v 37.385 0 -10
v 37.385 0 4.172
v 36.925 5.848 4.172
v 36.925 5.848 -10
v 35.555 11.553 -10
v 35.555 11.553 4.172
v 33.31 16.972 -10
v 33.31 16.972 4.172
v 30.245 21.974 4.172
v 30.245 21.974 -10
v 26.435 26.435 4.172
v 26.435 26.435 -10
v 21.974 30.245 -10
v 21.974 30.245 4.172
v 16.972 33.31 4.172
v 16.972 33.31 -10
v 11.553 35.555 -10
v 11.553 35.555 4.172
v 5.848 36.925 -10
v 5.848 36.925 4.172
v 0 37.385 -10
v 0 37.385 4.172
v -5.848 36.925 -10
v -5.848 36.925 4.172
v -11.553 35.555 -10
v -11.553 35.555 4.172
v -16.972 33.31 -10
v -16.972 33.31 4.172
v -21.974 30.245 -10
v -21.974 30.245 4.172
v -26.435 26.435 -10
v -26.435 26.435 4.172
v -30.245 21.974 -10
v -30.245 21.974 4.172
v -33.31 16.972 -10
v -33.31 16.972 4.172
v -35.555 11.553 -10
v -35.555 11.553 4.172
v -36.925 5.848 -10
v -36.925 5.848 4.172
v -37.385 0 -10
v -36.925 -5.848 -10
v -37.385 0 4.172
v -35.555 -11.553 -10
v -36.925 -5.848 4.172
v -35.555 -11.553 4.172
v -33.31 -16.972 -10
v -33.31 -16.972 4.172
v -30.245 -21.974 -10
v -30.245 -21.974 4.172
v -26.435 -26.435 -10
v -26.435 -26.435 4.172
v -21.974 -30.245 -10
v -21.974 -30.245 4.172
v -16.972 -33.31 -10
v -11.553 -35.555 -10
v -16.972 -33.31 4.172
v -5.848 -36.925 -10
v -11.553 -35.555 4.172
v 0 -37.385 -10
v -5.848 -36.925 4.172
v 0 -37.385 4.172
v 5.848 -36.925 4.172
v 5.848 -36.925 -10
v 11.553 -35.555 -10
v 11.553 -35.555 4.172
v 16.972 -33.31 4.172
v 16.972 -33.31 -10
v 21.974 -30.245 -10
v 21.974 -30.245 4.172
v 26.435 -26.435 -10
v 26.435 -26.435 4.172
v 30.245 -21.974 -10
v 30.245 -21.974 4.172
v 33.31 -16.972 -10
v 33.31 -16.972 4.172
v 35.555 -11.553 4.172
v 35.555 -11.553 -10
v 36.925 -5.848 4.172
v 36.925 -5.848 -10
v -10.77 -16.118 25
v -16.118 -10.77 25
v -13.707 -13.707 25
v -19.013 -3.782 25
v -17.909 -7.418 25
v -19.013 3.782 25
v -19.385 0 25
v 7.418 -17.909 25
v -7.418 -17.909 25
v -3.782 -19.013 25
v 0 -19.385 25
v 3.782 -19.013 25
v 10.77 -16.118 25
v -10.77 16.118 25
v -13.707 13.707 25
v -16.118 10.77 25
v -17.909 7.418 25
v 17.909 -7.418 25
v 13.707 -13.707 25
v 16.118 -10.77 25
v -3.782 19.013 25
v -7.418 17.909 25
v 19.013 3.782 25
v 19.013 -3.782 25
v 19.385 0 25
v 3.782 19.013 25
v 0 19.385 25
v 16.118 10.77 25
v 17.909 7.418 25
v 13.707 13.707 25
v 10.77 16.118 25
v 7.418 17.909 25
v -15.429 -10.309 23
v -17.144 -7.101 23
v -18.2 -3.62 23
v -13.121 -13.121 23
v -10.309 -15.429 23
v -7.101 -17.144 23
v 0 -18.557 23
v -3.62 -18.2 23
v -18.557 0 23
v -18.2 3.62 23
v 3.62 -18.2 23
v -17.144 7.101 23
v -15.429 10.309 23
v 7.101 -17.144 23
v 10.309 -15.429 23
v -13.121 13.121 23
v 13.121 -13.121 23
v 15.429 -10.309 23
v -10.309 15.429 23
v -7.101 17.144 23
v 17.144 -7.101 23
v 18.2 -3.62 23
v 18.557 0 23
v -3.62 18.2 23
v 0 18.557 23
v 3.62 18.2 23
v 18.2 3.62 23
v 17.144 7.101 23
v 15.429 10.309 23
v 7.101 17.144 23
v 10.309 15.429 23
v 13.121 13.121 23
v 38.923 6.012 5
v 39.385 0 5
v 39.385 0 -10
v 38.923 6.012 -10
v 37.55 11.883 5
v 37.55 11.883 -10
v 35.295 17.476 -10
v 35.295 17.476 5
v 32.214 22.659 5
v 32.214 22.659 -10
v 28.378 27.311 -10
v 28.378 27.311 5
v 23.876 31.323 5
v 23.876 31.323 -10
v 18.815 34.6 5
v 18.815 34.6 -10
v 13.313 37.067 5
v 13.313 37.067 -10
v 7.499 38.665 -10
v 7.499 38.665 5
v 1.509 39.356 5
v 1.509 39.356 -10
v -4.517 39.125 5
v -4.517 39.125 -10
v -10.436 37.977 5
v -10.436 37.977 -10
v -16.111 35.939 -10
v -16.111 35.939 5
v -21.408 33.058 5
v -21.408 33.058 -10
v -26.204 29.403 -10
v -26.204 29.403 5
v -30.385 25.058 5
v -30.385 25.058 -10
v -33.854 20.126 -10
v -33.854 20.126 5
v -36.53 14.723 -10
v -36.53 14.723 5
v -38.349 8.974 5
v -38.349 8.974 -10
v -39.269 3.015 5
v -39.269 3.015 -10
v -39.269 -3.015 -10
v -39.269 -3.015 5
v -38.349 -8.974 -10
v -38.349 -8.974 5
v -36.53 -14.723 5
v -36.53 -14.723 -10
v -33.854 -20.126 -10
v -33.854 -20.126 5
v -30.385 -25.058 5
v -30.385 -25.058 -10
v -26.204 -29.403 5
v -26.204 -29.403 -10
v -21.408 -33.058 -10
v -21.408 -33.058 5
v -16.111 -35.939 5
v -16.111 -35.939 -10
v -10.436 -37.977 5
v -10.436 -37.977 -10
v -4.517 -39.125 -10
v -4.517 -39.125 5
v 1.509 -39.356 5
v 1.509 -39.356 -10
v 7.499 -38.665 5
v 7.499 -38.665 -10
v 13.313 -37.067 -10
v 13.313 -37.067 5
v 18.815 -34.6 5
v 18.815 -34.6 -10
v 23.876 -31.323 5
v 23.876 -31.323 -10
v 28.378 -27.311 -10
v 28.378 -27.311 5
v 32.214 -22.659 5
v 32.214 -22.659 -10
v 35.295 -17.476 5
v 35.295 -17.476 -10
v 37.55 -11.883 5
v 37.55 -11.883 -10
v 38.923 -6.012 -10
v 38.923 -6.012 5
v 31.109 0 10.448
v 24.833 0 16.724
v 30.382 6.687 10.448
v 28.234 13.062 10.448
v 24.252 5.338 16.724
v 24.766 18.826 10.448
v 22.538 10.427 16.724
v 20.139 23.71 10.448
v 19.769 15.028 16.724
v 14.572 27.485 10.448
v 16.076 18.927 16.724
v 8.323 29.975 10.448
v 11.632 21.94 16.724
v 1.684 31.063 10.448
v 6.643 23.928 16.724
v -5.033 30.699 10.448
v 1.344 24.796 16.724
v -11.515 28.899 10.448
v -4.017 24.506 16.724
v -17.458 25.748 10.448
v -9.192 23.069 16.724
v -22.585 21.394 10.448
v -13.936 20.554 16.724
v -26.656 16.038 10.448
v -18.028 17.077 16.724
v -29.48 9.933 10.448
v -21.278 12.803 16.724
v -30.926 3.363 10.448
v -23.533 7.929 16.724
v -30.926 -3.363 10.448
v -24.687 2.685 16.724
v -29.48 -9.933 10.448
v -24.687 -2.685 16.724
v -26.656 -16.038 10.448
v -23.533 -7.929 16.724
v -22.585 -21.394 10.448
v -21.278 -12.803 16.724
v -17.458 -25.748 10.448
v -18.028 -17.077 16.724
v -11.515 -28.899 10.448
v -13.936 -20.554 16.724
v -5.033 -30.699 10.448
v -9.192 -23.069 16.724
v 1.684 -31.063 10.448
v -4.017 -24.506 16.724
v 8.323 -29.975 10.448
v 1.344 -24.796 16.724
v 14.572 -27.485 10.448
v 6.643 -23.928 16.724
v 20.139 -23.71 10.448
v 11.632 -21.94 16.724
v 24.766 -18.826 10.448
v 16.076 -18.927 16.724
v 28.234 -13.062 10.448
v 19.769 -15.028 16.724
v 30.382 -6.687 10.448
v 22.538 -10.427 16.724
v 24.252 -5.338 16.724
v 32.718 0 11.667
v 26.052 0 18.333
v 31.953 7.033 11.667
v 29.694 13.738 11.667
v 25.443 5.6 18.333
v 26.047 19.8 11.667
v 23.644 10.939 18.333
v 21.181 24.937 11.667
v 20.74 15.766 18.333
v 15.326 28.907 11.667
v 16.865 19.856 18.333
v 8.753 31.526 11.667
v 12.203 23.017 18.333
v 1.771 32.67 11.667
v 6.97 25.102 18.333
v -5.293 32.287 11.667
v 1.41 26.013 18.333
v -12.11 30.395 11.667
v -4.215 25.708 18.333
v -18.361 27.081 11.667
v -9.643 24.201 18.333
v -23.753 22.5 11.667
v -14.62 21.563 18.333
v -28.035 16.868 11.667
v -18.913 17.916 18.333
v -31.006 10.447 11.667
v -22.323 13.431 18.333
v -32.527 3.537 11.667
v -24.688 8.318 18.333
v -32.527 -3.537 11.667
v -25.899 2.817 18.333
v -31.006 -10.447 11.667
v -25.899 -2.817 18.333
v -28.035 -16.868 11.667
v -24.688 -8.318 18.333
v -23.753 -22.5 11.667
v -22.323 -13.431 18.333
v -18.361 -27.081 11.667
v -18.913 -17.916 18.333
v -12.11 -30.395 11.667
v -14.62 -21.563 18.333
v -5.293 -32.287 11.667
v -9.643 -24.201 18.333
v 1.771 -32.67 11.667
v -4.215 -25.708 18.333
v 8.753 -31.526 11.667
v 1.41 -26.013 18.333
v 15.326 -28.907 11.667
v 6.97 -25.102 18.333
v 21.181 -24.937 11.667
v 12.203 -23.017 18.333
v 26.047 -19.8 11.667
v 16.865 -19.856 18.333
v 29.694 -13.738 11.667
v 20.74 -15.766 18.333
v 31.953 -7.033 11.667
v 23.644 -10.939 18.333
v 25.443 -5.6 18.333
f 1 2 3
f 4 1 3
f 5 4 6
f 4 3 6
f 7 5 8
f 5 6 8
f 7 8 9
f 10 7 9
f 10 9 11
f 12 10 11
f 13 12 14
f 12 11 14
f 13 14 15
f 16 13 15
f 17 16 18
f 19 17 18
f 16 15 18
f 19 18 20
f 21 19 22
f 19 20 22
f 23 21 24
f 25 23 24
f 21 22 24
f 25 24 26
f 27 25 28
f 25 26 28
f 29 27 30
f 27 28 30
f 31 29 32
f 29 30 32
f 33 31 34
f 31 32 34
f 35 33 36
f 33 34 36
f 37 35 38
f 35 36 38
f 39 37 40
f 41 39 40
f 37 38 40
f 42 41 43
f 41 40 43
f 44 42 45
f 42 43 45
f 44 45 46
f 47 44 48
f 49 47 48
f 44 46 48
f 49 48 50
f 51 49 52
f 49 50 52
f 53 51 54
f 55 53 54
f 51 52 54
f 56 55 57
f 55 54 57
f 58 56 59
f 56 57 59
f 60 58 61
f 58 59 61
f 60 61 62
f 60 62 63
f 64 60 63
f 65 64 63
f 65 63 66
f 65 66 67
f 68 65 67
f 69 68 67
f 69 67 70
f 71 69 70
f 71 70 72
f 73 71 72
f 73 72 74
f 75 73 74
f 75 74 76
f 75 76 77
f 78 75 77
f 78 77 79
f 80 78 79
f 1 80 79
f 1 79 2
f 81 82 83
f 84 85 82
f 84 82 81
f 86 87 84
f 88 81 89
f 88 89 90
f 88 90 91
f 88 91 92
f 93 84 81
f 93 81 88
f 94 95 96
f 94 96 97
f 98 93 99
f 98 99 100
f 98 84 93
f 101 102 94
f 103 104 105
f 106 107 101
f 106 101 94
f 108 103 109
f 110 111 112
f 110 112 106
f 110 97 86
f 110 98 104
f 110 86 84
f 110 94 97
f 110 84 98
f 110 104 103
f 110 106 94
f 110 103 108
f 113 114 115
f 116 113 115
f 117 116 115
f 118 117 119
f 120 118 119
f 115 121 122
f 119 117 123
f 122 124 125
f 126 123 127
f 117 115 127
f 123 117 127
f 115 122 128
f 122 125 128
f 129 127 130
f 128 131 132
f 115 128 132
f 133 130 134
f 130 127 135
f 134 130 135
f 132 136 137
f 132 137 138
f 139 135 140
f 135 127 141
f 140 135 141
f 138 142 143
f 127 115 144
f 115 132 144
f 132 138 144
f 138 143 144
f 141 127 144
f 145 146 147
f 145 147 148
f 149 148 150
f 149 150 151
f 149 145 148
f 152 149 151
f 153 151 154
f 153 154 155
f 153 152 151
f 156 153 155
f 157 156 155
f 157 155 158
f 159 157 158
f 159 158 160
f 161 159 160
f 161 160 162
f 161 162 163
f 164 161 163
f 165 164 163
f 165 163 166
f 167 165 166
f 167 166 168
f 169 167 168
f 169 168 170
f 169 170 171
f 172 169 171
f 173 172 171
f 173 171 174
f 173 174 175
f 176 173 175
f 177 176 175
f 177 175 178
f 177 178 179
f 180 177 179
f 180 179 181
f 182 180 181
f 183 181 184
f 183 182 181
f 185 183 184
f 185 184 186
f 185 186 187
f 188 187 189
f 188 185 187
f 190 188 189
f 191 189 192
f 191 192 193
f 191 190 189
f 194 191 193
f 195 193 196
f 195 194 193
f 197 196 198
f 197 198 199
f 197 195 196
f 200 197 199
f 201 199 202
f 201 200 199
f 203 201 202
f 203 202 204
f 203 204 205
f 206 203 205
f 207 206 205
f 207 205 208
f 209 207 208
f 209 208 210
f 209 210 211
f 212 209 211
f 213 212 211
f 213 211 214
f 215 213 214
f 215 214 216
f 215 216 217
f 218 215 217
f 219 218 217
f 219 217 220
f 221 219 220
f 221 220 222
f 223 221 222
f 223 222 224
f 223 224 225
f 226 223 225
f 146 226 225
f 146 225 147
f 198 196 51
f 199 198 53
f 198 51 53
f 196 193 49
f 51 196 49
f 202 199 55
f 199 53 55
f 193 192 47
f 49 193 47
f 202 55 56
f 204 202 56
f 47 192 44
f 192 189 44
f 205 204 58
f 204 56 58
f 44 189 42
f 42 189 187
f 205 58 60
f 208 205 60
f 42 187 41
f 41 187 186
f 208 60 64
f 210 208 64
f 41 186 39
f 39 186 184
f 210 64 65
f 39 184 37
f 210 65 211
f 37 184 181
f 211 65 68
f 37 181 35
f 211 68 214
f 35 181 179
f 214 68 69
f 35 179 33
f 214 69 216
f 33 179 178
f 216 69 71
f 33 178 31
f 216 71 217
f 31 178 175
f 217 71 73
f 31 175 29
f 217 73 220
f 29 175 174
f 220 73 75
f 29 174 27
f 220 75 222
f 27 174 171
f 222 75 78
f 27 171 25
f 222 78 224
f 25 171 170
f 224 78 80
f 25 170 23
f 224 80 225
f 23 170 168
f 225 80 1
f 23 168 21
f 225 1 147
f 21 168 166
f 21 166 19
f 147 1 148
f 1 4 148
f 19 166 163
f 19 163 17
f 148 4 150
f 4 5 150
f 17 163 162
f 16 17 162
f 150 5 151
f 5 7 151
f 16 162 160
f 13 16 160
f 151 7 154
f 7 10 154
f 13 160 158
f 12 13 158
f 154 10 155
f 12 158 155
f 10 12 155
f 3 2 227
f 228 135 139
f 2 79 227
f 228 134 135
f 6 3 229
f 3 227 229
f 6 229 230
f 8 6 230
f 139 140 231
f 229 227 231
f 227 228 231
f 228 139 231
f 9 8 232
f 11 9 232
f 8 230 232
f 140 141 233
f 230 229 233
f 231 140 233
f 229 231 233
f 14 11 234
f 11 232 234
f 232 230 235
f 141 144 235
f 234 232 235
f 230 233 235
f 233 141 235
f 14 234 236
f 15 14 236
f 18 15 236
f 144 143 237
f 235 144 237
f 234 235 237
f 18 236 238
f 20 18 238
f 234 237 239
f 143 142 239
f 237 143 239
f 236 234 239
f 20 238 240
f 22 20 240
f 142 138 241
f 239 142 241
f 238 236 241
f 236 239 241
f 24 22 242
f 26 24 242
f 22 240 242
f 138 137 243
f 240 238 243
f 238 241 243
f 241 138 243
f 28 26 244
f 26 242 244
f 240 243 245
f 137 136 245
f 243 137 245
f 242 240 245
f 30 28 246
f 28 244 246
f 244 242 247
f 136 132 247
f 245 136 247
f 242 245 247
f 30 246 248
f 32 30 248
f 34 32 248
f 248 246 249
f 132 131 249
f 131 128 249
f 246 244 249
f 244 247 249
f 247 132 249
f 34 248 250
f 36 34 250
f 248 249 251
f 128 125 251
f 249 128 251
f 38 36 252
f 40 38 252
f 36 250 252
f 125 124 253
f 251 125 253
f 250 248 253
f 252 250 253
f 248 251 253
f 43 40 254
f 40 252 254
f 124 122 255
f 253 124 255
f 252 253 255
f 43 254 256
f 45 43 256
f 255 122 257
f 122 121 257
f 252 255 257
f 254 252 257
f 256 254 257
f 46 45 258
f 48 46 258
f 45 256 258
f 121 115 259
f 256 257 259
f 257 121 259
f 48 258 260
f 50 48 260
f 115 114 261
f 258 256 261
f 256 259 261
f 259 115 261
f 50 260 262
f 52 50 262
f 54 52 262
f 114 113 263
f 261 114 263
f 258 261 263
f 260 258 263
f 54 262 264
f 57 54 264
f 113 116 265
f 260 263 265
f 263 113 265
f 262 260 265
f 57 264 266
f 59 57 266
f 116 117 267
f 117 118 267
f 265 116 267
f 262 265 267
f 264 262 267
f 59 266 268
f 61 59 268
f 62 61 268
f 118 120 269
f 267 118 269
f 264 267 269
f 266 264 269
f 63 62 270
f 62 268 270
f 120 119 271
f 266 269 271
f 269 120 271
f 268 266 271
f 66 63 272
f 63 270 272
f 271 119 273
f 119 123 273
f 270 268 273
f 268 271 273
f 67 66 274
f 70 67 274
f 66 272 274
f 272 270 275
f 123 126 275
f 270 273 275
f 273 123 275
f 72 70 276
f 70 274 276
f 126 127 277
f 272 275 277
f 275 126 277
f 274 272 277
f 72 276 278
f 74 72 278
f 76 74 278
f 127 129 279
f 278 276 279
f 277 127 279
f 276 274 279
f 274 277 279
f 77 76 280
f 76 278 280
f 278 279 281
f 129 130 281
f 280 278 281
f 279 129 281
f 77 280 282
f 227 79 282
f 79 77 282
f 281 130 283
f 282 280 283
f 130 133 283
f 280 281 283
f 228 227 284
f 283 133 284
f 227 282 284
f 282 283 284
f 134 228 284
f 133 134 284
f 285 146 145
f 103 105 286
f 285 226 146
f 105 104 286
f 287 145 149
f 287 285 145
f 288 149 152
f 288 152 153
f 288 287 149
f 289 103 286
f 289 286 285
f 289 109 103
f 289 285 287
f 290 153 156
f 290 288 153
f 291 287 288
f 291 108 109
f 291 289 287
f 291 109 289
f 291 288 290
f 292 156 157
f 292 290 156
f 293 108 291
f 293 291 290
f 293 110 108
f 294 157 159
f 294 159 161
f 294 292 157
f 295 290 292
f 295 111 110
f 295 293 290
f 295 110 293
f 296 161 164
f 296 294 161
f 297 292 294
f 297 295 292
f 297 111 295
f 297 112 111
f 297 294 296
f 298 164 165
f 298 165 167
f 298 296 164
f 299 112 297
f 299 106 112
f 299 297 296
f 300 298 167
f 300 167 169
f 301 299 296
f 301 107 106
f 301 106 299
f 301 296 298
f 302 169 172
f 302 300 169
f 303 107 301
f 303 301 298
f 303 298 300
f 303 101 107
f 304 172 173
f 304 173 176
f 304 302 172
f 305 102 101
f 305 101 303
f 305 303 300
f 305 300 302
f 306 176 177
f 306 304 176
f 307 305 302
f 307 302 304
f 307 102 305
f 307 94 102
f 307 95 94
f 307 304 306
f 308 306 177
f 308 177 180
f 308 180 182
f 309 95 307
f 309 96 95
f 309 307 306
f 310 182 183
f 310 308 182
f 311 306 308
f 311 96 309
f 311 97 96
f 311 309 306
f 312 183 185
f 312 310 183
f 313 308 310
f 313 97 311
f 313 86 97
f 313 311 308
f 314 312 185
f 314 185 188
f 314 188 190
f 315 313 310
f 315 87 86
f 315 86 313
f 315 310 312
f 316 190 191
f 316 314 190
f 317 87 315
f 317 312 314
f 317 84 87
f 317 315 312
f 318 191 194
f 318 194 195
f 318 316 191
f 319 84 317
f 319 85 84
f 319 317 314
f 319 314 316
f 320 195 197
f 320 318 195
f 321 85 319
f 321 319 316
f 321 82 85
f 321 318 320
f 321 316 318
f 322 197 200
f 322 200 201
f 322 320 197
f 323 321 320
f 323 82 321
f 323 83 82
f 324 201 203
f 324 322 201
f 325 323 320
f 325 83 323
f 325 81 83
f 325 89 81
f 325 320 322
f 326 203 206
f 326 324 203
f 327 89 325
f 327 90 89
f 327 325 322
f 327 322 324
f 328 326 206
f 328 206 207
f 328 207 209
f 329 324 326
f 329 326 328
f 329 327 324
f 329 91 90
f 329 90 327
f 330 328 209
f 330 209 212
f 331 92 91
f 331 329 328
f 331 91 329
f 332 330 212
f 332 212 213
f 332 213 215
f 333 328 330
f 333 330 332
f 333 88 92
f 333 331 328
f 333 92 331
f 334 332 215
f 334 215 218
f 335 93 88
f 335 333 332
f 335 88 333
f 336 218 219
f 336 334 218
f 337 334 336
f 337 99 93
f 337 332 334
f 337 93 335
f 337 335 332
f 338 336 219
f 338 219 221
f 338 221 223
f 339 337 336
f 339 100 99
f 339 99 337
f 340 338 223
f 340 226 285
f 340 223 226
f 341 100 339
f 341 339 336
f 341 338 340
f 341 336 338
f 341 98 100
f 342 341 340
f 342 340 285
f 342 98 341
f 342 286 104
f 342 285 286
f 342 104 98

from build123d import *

# Parameters (mm, degrees)
F0_R          = 39.385
F1_DEPTH      = 25
F1_DEPTH_BACK = 10
F2_SIZE       = 20
F3_T          = -2


with BuildPart() as f1:
    # F0 (on Top) → F1 (new body, two sides)
    with BuildSketch(Plane.XY) as f1_sk:
        Circle(F0_R)
    extrude(amount=F1_DEPTH)
    extrude(f1_sk.sketch, amount=-F1_DEPTH_BACK)

    # F2
    f2_edges = [f1.edges().sort_by_distance(p)[0] for p in [
        (-39.385, 0, 25),
    ]]
    chamfer(f2_edges, length=F2_SIZE)

    # F3
    f3_openings = [f1.faces().sort_by_distance(p)[0] for p in [
        (0, 0, -10),
    ]]
    offset(amount=F3_T, openings=f3_openings)


solid = f1.part
